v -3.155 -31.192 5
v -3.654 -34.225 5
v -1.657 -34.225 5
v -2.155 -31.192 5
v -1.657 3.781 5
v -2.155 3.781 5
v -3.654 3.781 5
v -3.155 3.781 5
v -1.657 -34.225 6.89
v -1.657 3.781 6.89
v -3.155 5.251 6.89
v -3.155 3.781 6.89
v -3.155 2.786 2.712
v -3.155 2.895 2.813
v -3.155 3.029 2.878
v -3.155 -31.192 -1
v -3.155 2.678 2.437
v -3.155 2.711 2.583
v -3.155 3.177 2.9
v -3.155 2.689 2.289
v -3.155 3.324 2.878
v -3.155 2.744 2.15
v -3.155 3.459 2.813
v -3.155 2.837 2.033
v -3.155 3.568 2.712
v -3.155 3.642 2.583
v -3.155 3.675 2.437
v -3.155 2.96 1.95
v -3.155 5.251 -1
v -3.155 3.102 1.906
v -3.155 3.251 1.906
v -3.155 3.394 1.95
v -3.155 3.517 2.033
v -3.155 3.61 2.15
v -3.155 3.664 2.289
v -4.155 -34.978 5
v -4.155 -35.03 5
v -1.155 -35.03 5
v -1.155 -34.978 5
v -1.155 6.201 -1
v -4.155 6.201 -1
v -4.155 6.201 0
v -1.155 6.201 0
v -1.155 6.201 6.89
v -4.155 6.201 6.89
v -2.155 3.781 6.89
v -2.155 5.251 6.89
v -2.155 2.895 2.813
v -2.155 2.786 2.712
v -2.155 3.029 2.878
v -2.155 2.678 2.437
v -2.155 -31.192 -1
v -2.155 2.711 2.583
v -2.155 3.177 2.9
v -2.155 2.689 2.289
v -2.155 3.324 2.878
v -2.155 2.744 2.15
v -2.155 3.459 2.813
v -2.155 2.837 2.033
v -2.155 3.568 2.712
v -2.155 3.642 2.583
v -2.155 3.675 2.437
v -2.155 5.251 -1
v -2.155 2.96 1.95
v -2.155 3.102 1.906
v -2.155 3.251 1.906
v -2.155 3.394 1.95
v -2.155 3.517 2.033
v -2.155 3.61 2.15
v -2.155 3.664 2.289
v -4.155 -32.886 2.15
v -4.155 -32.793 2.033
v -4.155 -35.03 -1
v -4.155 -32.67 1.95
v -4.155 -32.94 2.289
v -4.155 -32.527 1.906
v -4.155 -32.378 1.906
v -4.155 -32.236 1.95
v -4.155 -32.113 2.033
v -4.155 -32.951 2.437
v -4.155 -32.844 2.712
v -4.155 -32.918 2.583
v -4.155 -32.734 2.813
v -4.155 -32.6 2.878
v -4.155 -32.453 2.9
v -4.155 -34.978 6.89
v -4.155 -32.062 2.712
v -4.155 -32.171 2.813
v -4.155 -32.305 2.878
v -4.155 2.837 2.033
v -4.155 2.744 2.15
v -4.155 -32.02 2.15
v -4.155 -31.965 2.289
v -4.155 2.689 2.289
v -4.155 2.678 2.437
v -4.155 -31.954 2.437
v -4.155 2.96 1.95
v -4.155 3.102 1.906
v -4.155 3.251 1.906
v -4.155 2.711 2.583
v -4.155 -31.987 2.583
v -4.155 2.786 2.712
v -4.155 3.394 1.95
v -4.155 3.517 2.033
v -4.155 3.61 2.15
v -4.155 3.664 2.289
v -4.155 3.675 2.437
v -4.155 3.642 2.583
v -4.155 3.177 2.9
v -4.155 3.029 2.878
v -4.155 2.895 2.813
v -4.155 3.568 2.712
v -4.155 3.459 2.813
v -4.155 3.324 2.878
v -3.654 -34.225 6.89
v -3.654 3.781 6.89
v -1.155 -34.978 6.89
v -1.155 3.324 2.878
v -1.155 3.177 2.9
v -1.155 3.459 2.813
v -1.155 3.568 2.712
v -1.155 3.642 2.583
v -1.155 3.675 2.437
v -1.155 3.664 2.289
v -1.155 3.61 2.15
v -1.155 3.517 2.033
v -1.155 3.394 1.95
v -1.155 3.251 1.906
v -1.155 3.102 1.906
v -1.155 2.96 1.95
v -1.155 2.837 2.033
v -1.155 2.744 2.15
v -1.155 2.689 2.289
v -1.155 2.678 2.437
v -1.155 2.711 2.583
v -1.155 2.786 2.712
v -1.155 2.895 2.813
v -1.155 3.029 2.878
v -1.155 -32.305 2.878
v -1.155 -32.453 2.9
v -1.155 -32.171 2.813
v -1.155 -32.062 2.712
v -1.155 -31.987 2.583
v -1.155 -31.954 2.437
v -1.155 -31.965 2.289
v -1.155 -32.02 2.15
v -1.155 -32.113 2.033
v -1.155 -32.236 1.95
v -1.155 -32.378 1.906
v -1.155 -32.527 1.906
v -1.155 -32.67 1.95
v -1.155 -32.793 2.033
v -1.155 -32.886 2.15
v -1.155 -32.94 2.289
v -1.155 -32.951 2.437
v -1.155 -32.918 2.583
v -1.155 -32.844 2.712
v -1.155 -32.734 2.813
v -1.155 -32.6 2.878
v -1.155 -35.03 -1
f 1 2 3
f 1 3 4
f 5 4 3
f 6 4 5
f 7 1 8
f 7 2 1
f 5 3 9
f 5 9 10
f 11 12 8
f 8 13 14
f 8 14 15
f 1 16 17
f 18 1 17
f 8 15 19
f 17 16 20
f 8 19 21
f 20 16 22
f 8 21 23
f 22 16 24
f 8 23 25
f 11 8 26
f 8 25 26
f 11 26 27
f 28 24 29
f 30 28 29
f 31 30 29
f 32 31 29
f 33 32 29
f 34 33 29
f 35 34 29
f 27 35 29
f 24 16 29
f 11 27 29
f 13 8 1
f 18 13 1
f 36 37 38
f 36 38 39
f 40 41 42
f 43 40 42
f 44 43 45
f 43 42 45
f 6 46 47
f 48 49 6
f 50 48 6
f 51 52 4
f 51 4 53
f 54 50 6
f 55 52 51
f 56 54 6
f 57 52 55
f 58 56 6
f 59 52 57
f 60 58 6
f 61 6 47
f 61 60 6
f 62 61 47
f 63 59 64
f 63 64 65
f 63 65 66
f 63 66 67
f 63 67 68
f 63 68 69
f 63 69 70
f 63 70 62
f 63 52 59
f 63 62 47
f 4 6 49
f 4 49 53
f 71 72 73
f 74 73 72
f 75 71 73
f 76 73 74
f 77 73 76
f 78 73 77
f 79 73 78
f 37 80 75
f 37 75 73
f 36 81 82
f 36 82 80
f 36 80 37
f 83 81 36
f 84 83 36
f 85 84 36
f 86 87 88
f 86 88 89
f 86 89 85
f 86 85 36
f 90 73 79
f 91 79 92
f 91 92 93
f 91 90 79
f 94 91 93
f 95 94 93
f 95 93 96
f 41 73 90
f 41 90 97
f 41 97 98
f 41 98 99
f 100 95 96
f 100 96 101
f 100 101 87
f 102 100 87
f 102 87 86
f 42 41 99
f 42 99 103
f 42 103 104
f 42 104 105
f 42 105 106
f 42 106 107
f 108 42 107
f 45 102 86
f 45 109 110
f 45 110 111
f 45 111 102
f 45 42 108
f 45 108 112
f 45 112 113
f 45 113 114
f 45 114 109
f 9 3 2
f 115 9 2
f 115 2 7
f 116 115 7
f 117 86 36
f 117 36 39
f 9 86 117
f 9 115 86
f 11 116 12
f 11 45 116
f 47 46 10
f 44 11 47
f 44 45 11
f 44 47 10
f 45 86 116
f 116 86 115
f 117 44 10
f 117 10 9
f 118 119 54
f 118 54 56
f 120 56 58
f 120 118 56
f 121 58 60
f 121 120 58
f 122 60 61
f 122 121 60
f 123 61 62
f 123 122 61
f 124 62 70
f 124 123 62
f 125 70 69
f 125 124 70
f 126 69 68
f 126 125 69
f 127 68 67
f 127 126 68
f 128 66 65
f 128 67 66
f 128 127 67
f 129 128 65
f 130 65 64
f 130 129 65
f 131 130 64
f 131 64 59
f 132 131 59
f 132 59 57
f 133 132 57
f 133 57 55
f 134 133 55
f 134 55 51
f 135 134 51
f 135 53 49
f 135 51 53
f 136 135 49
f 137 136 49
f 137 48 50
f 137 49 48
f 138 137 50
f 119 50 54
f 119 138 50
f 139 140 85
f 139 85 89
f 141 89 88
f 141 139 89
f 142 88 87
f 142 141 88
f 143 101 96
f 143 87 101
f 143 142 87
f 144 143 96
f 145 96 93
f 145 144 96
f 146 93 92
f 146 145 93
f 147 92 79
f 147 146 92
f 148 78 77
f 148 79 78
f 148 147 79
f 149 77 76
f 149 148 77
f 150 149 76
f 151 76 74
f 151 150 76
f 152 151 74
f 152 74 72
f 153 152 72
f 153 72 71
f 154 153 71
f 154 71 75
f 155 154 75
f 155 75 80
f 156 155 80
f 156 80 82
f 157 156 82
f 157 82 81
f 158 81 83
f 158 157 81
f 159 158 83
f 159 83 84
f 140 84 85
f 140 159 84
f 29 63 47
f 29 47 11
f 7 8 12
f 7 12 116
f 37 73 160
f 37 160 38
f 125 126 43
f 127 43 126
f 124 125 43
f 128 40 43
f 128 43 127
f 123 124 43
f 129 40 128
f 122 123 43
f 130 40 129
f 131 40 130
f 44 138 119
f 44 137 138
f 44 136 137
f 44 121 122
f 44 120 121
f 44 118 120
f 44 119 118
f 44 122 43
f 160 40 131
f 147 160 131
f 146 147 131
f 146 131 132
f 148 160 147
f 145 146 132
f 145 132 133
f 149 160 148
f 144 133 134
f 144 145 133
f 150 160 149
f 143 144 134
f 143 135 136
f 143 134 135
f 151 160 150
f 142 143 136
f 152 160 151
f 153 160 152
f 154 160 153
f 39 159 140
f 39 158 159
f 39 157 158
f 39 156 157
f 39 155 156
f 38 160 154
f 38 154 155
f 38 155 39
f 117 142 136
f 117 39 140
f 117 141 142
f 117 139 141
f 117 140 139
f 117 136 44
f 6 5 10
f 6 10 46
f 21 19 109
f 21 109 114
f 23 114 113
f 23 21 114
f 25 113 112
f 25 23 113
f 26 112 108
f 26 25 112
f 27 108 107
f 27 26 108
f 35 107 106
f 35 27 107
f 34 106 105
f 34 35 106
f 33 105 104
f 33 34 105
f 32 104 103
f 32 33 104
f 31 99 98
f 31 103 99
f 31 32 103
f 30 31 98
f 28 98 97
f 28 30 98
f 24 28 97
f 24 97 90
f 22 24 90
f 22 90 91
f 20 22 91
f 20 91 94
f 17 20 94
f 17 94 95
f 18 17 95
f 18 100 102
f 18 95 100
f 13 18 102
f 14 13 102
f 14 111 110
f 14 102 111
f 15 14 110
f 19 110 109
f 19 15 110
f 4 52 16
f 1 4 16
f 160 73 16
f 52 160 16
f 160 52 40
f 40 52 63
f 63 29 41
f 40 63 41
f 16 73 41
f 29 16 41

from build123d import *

# Parameters (mm, degrees)
SKETCH1_W               = 3.5
SKETCH1_H               = 11.179611651
BOSS_EXTRUDE1_DEPTH     = 6.89
CUT_EXTRUDE1_DEPTH      = 10.908590231
CUT_EXTRUDE1_DEPTH_BACK = 10.908590231
SKETCH3_R               = 0.5
SKETCH4_W               = 0.5
SKETCH4_H               = 6.89
CUT_EXTRUDE2_DEPTH      = 15
SKETCH5_W               = 3
SKETCH5_H               = 6.89
BOSS_EXTRUDE2_DEPTH     = 13
SKETCH6_W               = 3
SKETCH6_H               = 6.89
BOSS_EXTRUDE3_DEPTH     = 17
SKETCH7_W               = 1.997637341
SKETCH7_H               = 38.005773156
CUT_EXTRUDE3_DEPTH      = 36.891646659
BOSS_EXTRUDE4_REACH     = 37.776
SKETCH8_W               = 6
SKETCH8_H               = 41.231307055
CUT_EXTRUDE4_DEPTH      = 36.826841099
CUT_EXTRUDE4_DEPTH_BACK = 36.826841099
SKETCH9_R               = 0.5
SKETCH10_W              = 1
SKETCH10_H              = 36.442912435
CUT_EXTRUDE5_DEPTH      = 42
CUT_EXTRUDE6_DEPTH      = 36.826841099
CUT_EXTRUDE6_DEPTH_BACK = 36.826841099
SKETCH11_R              = 0.5


with BuildPart() as part:
    # Sketch1 → Boss-Extrude1 (new body)
    with BuildSketch(Plane.XY):
        with Locations((-2.905339806, 0.611650485)):
            Rectangle(SKETCH1_W, SKETCH1_H)
    extrude(amount=BOSS_EXTRUDE1_DEPTH)

    # Sketch3 → Cut-Extrude1 (cut, two sides: drawn at the far end of the back side and taken through both)
    with BuildSketch(Plane(origin=(-1.155339806, 0, 0), x_dir=(0, 0, -1), z_dir=(1, 0, 0)).offset(-CUT_EXTRUDE1_DEPTH_BACK)):
        with Locations((-2, 4.896048014)):
            Circle(SKETCH3_R)
    extrude(amount=CUT_EXTRUDE1_DEPTH + CUT_EXTRUDE1_DEPTH_BACK, mode=Mode.SUBTRACT)

    # Sketch4 → Cut-Extrude2 (cut)
    with BuildSketch(Plane.XZ.offset(4.97815534)):
        with Locations((-4.405339806, 3.445)):
            Rectangle(SKETCH4_W, SKETCH4_H)
    extrude(amount=-CUT_EXTRUDE2_DEPTH, mode=Mode.SUBTRACT)

    # Sketch5 → Boss-Extrude2 (add)
    with BuildSketch(Plane.XZ.offset(4.97815534)):
        with Locations((-2.655339806, 3.445)):
            Rectangle(SKETCH5_W, SKETCH5_H)
    extrude(amount=BOSS_EXTRUDE2_DEPTH)

    # Sketch6 → Boss-Extrude3 (add)
    with BuildSketch(Plane.XZ.offset(17.97815534)):
        with Locations((-2.655339806, 3.445)):
            Rectangle(SKETCH6_W, SKETCH6_H)
    extrude(amount=BOSS_EXTRUDE3_DEPTH)

    # Sketch7 → Cut-Extrude3 (cut, through all)
    with BuildSketch(Plane(origin=(0, 0, 0), x_dir=(-1, 0, 0), z_dir=(0, 0, -1))):
        with Locations((2.655339806, -15.222333021)):
            Rectangle(SKETCH7_W, SKETCH7_H)
    extrude(amount=-CUT_EXTRUDE3_DEPTH, mode=Mode.SUBTRACT)

    # Boss-Extrude4: up to this face of the body (flat: up to its plane)
    boss_extrude4_end = Plane(part.part.faces().sort_by_distance((-1.155339806, -14.44187965, 3.449011069))[0])
    # Sketch8 → Boss-Extrude4 (add, up to the picked face)
    with BuildSketch(Plane.ZY.offset(4.155339806), mode=Mode.PRIVATE) as boss_extrude4_sk1:
        with Locations((2, -14.414197216)):
            Rectangle(SKETCH8_W, SKETCH8_H)
    boss_extrude4_tool1 = split(extrude(boss_extrude4_sk1.sketch, amount=-BOSS_EXTRUDE4_REACH, mode=Mode.PRIVATE), bisect_by=boss_extrude4_end, keep=Keep.BOTH, mode=Mode.PRIVATE)
    add(boss_extrude4_tool1.solids().sort_by(Axis((-4.15534, -14.414197, 2), (1, 0, 0)))[0])

    # Sketch9 → Cut-Extrude4 (cut, two sides: drawn at the far end of the back side and taken through both)
    with BuildSketch(Plane.ZY.offset(4.155339806).offset(-CUT_EXTRUDE4_DEPTH_BACK)):
        with Locations((2.4, -32.452738379)):
            Circle(SKETCH9_R)
    extrude(amount=CUT_EXTRUDE4_DEPTH + CUT_EXTRUDE4_DEPTH_BACK, mode=Mode.SUBTRACT)

    # Sketch10 → Cut-Extrude5 (cut)
    with BuildSketch(Plane(origin=(0, 0, -1), x_dir=(-1, 0, 0), z_dir=(0, 0, -1))):
        with Locations((2.655339806, -12.970585166)):
            Rectangle(SKETCH10_W, SKETCH10_H)
    extrude(amount=-CUT_EXTRUDE5_DEPTH, mode=Mode.SUBTRACT)

    # Sketch11 → Cut-Extrude6 (cut, two sides: drawn at the far end of the back side and taken through both)
    with BuildSketch(Plane.ZY.offset(4.155339806).offset(-CUT_EXTRUDE6_DEPTH_BACK)):
        with Locations((2.4, 3.176876258)):
            Circle(SKETCH11_R)
    extrude(amount=CUT_EXTRUDE6_DEPTH + CUT_EXTRUDE6_DEPTH_BACK, mode=Mode.SUBTRACT)


solid = part.part
